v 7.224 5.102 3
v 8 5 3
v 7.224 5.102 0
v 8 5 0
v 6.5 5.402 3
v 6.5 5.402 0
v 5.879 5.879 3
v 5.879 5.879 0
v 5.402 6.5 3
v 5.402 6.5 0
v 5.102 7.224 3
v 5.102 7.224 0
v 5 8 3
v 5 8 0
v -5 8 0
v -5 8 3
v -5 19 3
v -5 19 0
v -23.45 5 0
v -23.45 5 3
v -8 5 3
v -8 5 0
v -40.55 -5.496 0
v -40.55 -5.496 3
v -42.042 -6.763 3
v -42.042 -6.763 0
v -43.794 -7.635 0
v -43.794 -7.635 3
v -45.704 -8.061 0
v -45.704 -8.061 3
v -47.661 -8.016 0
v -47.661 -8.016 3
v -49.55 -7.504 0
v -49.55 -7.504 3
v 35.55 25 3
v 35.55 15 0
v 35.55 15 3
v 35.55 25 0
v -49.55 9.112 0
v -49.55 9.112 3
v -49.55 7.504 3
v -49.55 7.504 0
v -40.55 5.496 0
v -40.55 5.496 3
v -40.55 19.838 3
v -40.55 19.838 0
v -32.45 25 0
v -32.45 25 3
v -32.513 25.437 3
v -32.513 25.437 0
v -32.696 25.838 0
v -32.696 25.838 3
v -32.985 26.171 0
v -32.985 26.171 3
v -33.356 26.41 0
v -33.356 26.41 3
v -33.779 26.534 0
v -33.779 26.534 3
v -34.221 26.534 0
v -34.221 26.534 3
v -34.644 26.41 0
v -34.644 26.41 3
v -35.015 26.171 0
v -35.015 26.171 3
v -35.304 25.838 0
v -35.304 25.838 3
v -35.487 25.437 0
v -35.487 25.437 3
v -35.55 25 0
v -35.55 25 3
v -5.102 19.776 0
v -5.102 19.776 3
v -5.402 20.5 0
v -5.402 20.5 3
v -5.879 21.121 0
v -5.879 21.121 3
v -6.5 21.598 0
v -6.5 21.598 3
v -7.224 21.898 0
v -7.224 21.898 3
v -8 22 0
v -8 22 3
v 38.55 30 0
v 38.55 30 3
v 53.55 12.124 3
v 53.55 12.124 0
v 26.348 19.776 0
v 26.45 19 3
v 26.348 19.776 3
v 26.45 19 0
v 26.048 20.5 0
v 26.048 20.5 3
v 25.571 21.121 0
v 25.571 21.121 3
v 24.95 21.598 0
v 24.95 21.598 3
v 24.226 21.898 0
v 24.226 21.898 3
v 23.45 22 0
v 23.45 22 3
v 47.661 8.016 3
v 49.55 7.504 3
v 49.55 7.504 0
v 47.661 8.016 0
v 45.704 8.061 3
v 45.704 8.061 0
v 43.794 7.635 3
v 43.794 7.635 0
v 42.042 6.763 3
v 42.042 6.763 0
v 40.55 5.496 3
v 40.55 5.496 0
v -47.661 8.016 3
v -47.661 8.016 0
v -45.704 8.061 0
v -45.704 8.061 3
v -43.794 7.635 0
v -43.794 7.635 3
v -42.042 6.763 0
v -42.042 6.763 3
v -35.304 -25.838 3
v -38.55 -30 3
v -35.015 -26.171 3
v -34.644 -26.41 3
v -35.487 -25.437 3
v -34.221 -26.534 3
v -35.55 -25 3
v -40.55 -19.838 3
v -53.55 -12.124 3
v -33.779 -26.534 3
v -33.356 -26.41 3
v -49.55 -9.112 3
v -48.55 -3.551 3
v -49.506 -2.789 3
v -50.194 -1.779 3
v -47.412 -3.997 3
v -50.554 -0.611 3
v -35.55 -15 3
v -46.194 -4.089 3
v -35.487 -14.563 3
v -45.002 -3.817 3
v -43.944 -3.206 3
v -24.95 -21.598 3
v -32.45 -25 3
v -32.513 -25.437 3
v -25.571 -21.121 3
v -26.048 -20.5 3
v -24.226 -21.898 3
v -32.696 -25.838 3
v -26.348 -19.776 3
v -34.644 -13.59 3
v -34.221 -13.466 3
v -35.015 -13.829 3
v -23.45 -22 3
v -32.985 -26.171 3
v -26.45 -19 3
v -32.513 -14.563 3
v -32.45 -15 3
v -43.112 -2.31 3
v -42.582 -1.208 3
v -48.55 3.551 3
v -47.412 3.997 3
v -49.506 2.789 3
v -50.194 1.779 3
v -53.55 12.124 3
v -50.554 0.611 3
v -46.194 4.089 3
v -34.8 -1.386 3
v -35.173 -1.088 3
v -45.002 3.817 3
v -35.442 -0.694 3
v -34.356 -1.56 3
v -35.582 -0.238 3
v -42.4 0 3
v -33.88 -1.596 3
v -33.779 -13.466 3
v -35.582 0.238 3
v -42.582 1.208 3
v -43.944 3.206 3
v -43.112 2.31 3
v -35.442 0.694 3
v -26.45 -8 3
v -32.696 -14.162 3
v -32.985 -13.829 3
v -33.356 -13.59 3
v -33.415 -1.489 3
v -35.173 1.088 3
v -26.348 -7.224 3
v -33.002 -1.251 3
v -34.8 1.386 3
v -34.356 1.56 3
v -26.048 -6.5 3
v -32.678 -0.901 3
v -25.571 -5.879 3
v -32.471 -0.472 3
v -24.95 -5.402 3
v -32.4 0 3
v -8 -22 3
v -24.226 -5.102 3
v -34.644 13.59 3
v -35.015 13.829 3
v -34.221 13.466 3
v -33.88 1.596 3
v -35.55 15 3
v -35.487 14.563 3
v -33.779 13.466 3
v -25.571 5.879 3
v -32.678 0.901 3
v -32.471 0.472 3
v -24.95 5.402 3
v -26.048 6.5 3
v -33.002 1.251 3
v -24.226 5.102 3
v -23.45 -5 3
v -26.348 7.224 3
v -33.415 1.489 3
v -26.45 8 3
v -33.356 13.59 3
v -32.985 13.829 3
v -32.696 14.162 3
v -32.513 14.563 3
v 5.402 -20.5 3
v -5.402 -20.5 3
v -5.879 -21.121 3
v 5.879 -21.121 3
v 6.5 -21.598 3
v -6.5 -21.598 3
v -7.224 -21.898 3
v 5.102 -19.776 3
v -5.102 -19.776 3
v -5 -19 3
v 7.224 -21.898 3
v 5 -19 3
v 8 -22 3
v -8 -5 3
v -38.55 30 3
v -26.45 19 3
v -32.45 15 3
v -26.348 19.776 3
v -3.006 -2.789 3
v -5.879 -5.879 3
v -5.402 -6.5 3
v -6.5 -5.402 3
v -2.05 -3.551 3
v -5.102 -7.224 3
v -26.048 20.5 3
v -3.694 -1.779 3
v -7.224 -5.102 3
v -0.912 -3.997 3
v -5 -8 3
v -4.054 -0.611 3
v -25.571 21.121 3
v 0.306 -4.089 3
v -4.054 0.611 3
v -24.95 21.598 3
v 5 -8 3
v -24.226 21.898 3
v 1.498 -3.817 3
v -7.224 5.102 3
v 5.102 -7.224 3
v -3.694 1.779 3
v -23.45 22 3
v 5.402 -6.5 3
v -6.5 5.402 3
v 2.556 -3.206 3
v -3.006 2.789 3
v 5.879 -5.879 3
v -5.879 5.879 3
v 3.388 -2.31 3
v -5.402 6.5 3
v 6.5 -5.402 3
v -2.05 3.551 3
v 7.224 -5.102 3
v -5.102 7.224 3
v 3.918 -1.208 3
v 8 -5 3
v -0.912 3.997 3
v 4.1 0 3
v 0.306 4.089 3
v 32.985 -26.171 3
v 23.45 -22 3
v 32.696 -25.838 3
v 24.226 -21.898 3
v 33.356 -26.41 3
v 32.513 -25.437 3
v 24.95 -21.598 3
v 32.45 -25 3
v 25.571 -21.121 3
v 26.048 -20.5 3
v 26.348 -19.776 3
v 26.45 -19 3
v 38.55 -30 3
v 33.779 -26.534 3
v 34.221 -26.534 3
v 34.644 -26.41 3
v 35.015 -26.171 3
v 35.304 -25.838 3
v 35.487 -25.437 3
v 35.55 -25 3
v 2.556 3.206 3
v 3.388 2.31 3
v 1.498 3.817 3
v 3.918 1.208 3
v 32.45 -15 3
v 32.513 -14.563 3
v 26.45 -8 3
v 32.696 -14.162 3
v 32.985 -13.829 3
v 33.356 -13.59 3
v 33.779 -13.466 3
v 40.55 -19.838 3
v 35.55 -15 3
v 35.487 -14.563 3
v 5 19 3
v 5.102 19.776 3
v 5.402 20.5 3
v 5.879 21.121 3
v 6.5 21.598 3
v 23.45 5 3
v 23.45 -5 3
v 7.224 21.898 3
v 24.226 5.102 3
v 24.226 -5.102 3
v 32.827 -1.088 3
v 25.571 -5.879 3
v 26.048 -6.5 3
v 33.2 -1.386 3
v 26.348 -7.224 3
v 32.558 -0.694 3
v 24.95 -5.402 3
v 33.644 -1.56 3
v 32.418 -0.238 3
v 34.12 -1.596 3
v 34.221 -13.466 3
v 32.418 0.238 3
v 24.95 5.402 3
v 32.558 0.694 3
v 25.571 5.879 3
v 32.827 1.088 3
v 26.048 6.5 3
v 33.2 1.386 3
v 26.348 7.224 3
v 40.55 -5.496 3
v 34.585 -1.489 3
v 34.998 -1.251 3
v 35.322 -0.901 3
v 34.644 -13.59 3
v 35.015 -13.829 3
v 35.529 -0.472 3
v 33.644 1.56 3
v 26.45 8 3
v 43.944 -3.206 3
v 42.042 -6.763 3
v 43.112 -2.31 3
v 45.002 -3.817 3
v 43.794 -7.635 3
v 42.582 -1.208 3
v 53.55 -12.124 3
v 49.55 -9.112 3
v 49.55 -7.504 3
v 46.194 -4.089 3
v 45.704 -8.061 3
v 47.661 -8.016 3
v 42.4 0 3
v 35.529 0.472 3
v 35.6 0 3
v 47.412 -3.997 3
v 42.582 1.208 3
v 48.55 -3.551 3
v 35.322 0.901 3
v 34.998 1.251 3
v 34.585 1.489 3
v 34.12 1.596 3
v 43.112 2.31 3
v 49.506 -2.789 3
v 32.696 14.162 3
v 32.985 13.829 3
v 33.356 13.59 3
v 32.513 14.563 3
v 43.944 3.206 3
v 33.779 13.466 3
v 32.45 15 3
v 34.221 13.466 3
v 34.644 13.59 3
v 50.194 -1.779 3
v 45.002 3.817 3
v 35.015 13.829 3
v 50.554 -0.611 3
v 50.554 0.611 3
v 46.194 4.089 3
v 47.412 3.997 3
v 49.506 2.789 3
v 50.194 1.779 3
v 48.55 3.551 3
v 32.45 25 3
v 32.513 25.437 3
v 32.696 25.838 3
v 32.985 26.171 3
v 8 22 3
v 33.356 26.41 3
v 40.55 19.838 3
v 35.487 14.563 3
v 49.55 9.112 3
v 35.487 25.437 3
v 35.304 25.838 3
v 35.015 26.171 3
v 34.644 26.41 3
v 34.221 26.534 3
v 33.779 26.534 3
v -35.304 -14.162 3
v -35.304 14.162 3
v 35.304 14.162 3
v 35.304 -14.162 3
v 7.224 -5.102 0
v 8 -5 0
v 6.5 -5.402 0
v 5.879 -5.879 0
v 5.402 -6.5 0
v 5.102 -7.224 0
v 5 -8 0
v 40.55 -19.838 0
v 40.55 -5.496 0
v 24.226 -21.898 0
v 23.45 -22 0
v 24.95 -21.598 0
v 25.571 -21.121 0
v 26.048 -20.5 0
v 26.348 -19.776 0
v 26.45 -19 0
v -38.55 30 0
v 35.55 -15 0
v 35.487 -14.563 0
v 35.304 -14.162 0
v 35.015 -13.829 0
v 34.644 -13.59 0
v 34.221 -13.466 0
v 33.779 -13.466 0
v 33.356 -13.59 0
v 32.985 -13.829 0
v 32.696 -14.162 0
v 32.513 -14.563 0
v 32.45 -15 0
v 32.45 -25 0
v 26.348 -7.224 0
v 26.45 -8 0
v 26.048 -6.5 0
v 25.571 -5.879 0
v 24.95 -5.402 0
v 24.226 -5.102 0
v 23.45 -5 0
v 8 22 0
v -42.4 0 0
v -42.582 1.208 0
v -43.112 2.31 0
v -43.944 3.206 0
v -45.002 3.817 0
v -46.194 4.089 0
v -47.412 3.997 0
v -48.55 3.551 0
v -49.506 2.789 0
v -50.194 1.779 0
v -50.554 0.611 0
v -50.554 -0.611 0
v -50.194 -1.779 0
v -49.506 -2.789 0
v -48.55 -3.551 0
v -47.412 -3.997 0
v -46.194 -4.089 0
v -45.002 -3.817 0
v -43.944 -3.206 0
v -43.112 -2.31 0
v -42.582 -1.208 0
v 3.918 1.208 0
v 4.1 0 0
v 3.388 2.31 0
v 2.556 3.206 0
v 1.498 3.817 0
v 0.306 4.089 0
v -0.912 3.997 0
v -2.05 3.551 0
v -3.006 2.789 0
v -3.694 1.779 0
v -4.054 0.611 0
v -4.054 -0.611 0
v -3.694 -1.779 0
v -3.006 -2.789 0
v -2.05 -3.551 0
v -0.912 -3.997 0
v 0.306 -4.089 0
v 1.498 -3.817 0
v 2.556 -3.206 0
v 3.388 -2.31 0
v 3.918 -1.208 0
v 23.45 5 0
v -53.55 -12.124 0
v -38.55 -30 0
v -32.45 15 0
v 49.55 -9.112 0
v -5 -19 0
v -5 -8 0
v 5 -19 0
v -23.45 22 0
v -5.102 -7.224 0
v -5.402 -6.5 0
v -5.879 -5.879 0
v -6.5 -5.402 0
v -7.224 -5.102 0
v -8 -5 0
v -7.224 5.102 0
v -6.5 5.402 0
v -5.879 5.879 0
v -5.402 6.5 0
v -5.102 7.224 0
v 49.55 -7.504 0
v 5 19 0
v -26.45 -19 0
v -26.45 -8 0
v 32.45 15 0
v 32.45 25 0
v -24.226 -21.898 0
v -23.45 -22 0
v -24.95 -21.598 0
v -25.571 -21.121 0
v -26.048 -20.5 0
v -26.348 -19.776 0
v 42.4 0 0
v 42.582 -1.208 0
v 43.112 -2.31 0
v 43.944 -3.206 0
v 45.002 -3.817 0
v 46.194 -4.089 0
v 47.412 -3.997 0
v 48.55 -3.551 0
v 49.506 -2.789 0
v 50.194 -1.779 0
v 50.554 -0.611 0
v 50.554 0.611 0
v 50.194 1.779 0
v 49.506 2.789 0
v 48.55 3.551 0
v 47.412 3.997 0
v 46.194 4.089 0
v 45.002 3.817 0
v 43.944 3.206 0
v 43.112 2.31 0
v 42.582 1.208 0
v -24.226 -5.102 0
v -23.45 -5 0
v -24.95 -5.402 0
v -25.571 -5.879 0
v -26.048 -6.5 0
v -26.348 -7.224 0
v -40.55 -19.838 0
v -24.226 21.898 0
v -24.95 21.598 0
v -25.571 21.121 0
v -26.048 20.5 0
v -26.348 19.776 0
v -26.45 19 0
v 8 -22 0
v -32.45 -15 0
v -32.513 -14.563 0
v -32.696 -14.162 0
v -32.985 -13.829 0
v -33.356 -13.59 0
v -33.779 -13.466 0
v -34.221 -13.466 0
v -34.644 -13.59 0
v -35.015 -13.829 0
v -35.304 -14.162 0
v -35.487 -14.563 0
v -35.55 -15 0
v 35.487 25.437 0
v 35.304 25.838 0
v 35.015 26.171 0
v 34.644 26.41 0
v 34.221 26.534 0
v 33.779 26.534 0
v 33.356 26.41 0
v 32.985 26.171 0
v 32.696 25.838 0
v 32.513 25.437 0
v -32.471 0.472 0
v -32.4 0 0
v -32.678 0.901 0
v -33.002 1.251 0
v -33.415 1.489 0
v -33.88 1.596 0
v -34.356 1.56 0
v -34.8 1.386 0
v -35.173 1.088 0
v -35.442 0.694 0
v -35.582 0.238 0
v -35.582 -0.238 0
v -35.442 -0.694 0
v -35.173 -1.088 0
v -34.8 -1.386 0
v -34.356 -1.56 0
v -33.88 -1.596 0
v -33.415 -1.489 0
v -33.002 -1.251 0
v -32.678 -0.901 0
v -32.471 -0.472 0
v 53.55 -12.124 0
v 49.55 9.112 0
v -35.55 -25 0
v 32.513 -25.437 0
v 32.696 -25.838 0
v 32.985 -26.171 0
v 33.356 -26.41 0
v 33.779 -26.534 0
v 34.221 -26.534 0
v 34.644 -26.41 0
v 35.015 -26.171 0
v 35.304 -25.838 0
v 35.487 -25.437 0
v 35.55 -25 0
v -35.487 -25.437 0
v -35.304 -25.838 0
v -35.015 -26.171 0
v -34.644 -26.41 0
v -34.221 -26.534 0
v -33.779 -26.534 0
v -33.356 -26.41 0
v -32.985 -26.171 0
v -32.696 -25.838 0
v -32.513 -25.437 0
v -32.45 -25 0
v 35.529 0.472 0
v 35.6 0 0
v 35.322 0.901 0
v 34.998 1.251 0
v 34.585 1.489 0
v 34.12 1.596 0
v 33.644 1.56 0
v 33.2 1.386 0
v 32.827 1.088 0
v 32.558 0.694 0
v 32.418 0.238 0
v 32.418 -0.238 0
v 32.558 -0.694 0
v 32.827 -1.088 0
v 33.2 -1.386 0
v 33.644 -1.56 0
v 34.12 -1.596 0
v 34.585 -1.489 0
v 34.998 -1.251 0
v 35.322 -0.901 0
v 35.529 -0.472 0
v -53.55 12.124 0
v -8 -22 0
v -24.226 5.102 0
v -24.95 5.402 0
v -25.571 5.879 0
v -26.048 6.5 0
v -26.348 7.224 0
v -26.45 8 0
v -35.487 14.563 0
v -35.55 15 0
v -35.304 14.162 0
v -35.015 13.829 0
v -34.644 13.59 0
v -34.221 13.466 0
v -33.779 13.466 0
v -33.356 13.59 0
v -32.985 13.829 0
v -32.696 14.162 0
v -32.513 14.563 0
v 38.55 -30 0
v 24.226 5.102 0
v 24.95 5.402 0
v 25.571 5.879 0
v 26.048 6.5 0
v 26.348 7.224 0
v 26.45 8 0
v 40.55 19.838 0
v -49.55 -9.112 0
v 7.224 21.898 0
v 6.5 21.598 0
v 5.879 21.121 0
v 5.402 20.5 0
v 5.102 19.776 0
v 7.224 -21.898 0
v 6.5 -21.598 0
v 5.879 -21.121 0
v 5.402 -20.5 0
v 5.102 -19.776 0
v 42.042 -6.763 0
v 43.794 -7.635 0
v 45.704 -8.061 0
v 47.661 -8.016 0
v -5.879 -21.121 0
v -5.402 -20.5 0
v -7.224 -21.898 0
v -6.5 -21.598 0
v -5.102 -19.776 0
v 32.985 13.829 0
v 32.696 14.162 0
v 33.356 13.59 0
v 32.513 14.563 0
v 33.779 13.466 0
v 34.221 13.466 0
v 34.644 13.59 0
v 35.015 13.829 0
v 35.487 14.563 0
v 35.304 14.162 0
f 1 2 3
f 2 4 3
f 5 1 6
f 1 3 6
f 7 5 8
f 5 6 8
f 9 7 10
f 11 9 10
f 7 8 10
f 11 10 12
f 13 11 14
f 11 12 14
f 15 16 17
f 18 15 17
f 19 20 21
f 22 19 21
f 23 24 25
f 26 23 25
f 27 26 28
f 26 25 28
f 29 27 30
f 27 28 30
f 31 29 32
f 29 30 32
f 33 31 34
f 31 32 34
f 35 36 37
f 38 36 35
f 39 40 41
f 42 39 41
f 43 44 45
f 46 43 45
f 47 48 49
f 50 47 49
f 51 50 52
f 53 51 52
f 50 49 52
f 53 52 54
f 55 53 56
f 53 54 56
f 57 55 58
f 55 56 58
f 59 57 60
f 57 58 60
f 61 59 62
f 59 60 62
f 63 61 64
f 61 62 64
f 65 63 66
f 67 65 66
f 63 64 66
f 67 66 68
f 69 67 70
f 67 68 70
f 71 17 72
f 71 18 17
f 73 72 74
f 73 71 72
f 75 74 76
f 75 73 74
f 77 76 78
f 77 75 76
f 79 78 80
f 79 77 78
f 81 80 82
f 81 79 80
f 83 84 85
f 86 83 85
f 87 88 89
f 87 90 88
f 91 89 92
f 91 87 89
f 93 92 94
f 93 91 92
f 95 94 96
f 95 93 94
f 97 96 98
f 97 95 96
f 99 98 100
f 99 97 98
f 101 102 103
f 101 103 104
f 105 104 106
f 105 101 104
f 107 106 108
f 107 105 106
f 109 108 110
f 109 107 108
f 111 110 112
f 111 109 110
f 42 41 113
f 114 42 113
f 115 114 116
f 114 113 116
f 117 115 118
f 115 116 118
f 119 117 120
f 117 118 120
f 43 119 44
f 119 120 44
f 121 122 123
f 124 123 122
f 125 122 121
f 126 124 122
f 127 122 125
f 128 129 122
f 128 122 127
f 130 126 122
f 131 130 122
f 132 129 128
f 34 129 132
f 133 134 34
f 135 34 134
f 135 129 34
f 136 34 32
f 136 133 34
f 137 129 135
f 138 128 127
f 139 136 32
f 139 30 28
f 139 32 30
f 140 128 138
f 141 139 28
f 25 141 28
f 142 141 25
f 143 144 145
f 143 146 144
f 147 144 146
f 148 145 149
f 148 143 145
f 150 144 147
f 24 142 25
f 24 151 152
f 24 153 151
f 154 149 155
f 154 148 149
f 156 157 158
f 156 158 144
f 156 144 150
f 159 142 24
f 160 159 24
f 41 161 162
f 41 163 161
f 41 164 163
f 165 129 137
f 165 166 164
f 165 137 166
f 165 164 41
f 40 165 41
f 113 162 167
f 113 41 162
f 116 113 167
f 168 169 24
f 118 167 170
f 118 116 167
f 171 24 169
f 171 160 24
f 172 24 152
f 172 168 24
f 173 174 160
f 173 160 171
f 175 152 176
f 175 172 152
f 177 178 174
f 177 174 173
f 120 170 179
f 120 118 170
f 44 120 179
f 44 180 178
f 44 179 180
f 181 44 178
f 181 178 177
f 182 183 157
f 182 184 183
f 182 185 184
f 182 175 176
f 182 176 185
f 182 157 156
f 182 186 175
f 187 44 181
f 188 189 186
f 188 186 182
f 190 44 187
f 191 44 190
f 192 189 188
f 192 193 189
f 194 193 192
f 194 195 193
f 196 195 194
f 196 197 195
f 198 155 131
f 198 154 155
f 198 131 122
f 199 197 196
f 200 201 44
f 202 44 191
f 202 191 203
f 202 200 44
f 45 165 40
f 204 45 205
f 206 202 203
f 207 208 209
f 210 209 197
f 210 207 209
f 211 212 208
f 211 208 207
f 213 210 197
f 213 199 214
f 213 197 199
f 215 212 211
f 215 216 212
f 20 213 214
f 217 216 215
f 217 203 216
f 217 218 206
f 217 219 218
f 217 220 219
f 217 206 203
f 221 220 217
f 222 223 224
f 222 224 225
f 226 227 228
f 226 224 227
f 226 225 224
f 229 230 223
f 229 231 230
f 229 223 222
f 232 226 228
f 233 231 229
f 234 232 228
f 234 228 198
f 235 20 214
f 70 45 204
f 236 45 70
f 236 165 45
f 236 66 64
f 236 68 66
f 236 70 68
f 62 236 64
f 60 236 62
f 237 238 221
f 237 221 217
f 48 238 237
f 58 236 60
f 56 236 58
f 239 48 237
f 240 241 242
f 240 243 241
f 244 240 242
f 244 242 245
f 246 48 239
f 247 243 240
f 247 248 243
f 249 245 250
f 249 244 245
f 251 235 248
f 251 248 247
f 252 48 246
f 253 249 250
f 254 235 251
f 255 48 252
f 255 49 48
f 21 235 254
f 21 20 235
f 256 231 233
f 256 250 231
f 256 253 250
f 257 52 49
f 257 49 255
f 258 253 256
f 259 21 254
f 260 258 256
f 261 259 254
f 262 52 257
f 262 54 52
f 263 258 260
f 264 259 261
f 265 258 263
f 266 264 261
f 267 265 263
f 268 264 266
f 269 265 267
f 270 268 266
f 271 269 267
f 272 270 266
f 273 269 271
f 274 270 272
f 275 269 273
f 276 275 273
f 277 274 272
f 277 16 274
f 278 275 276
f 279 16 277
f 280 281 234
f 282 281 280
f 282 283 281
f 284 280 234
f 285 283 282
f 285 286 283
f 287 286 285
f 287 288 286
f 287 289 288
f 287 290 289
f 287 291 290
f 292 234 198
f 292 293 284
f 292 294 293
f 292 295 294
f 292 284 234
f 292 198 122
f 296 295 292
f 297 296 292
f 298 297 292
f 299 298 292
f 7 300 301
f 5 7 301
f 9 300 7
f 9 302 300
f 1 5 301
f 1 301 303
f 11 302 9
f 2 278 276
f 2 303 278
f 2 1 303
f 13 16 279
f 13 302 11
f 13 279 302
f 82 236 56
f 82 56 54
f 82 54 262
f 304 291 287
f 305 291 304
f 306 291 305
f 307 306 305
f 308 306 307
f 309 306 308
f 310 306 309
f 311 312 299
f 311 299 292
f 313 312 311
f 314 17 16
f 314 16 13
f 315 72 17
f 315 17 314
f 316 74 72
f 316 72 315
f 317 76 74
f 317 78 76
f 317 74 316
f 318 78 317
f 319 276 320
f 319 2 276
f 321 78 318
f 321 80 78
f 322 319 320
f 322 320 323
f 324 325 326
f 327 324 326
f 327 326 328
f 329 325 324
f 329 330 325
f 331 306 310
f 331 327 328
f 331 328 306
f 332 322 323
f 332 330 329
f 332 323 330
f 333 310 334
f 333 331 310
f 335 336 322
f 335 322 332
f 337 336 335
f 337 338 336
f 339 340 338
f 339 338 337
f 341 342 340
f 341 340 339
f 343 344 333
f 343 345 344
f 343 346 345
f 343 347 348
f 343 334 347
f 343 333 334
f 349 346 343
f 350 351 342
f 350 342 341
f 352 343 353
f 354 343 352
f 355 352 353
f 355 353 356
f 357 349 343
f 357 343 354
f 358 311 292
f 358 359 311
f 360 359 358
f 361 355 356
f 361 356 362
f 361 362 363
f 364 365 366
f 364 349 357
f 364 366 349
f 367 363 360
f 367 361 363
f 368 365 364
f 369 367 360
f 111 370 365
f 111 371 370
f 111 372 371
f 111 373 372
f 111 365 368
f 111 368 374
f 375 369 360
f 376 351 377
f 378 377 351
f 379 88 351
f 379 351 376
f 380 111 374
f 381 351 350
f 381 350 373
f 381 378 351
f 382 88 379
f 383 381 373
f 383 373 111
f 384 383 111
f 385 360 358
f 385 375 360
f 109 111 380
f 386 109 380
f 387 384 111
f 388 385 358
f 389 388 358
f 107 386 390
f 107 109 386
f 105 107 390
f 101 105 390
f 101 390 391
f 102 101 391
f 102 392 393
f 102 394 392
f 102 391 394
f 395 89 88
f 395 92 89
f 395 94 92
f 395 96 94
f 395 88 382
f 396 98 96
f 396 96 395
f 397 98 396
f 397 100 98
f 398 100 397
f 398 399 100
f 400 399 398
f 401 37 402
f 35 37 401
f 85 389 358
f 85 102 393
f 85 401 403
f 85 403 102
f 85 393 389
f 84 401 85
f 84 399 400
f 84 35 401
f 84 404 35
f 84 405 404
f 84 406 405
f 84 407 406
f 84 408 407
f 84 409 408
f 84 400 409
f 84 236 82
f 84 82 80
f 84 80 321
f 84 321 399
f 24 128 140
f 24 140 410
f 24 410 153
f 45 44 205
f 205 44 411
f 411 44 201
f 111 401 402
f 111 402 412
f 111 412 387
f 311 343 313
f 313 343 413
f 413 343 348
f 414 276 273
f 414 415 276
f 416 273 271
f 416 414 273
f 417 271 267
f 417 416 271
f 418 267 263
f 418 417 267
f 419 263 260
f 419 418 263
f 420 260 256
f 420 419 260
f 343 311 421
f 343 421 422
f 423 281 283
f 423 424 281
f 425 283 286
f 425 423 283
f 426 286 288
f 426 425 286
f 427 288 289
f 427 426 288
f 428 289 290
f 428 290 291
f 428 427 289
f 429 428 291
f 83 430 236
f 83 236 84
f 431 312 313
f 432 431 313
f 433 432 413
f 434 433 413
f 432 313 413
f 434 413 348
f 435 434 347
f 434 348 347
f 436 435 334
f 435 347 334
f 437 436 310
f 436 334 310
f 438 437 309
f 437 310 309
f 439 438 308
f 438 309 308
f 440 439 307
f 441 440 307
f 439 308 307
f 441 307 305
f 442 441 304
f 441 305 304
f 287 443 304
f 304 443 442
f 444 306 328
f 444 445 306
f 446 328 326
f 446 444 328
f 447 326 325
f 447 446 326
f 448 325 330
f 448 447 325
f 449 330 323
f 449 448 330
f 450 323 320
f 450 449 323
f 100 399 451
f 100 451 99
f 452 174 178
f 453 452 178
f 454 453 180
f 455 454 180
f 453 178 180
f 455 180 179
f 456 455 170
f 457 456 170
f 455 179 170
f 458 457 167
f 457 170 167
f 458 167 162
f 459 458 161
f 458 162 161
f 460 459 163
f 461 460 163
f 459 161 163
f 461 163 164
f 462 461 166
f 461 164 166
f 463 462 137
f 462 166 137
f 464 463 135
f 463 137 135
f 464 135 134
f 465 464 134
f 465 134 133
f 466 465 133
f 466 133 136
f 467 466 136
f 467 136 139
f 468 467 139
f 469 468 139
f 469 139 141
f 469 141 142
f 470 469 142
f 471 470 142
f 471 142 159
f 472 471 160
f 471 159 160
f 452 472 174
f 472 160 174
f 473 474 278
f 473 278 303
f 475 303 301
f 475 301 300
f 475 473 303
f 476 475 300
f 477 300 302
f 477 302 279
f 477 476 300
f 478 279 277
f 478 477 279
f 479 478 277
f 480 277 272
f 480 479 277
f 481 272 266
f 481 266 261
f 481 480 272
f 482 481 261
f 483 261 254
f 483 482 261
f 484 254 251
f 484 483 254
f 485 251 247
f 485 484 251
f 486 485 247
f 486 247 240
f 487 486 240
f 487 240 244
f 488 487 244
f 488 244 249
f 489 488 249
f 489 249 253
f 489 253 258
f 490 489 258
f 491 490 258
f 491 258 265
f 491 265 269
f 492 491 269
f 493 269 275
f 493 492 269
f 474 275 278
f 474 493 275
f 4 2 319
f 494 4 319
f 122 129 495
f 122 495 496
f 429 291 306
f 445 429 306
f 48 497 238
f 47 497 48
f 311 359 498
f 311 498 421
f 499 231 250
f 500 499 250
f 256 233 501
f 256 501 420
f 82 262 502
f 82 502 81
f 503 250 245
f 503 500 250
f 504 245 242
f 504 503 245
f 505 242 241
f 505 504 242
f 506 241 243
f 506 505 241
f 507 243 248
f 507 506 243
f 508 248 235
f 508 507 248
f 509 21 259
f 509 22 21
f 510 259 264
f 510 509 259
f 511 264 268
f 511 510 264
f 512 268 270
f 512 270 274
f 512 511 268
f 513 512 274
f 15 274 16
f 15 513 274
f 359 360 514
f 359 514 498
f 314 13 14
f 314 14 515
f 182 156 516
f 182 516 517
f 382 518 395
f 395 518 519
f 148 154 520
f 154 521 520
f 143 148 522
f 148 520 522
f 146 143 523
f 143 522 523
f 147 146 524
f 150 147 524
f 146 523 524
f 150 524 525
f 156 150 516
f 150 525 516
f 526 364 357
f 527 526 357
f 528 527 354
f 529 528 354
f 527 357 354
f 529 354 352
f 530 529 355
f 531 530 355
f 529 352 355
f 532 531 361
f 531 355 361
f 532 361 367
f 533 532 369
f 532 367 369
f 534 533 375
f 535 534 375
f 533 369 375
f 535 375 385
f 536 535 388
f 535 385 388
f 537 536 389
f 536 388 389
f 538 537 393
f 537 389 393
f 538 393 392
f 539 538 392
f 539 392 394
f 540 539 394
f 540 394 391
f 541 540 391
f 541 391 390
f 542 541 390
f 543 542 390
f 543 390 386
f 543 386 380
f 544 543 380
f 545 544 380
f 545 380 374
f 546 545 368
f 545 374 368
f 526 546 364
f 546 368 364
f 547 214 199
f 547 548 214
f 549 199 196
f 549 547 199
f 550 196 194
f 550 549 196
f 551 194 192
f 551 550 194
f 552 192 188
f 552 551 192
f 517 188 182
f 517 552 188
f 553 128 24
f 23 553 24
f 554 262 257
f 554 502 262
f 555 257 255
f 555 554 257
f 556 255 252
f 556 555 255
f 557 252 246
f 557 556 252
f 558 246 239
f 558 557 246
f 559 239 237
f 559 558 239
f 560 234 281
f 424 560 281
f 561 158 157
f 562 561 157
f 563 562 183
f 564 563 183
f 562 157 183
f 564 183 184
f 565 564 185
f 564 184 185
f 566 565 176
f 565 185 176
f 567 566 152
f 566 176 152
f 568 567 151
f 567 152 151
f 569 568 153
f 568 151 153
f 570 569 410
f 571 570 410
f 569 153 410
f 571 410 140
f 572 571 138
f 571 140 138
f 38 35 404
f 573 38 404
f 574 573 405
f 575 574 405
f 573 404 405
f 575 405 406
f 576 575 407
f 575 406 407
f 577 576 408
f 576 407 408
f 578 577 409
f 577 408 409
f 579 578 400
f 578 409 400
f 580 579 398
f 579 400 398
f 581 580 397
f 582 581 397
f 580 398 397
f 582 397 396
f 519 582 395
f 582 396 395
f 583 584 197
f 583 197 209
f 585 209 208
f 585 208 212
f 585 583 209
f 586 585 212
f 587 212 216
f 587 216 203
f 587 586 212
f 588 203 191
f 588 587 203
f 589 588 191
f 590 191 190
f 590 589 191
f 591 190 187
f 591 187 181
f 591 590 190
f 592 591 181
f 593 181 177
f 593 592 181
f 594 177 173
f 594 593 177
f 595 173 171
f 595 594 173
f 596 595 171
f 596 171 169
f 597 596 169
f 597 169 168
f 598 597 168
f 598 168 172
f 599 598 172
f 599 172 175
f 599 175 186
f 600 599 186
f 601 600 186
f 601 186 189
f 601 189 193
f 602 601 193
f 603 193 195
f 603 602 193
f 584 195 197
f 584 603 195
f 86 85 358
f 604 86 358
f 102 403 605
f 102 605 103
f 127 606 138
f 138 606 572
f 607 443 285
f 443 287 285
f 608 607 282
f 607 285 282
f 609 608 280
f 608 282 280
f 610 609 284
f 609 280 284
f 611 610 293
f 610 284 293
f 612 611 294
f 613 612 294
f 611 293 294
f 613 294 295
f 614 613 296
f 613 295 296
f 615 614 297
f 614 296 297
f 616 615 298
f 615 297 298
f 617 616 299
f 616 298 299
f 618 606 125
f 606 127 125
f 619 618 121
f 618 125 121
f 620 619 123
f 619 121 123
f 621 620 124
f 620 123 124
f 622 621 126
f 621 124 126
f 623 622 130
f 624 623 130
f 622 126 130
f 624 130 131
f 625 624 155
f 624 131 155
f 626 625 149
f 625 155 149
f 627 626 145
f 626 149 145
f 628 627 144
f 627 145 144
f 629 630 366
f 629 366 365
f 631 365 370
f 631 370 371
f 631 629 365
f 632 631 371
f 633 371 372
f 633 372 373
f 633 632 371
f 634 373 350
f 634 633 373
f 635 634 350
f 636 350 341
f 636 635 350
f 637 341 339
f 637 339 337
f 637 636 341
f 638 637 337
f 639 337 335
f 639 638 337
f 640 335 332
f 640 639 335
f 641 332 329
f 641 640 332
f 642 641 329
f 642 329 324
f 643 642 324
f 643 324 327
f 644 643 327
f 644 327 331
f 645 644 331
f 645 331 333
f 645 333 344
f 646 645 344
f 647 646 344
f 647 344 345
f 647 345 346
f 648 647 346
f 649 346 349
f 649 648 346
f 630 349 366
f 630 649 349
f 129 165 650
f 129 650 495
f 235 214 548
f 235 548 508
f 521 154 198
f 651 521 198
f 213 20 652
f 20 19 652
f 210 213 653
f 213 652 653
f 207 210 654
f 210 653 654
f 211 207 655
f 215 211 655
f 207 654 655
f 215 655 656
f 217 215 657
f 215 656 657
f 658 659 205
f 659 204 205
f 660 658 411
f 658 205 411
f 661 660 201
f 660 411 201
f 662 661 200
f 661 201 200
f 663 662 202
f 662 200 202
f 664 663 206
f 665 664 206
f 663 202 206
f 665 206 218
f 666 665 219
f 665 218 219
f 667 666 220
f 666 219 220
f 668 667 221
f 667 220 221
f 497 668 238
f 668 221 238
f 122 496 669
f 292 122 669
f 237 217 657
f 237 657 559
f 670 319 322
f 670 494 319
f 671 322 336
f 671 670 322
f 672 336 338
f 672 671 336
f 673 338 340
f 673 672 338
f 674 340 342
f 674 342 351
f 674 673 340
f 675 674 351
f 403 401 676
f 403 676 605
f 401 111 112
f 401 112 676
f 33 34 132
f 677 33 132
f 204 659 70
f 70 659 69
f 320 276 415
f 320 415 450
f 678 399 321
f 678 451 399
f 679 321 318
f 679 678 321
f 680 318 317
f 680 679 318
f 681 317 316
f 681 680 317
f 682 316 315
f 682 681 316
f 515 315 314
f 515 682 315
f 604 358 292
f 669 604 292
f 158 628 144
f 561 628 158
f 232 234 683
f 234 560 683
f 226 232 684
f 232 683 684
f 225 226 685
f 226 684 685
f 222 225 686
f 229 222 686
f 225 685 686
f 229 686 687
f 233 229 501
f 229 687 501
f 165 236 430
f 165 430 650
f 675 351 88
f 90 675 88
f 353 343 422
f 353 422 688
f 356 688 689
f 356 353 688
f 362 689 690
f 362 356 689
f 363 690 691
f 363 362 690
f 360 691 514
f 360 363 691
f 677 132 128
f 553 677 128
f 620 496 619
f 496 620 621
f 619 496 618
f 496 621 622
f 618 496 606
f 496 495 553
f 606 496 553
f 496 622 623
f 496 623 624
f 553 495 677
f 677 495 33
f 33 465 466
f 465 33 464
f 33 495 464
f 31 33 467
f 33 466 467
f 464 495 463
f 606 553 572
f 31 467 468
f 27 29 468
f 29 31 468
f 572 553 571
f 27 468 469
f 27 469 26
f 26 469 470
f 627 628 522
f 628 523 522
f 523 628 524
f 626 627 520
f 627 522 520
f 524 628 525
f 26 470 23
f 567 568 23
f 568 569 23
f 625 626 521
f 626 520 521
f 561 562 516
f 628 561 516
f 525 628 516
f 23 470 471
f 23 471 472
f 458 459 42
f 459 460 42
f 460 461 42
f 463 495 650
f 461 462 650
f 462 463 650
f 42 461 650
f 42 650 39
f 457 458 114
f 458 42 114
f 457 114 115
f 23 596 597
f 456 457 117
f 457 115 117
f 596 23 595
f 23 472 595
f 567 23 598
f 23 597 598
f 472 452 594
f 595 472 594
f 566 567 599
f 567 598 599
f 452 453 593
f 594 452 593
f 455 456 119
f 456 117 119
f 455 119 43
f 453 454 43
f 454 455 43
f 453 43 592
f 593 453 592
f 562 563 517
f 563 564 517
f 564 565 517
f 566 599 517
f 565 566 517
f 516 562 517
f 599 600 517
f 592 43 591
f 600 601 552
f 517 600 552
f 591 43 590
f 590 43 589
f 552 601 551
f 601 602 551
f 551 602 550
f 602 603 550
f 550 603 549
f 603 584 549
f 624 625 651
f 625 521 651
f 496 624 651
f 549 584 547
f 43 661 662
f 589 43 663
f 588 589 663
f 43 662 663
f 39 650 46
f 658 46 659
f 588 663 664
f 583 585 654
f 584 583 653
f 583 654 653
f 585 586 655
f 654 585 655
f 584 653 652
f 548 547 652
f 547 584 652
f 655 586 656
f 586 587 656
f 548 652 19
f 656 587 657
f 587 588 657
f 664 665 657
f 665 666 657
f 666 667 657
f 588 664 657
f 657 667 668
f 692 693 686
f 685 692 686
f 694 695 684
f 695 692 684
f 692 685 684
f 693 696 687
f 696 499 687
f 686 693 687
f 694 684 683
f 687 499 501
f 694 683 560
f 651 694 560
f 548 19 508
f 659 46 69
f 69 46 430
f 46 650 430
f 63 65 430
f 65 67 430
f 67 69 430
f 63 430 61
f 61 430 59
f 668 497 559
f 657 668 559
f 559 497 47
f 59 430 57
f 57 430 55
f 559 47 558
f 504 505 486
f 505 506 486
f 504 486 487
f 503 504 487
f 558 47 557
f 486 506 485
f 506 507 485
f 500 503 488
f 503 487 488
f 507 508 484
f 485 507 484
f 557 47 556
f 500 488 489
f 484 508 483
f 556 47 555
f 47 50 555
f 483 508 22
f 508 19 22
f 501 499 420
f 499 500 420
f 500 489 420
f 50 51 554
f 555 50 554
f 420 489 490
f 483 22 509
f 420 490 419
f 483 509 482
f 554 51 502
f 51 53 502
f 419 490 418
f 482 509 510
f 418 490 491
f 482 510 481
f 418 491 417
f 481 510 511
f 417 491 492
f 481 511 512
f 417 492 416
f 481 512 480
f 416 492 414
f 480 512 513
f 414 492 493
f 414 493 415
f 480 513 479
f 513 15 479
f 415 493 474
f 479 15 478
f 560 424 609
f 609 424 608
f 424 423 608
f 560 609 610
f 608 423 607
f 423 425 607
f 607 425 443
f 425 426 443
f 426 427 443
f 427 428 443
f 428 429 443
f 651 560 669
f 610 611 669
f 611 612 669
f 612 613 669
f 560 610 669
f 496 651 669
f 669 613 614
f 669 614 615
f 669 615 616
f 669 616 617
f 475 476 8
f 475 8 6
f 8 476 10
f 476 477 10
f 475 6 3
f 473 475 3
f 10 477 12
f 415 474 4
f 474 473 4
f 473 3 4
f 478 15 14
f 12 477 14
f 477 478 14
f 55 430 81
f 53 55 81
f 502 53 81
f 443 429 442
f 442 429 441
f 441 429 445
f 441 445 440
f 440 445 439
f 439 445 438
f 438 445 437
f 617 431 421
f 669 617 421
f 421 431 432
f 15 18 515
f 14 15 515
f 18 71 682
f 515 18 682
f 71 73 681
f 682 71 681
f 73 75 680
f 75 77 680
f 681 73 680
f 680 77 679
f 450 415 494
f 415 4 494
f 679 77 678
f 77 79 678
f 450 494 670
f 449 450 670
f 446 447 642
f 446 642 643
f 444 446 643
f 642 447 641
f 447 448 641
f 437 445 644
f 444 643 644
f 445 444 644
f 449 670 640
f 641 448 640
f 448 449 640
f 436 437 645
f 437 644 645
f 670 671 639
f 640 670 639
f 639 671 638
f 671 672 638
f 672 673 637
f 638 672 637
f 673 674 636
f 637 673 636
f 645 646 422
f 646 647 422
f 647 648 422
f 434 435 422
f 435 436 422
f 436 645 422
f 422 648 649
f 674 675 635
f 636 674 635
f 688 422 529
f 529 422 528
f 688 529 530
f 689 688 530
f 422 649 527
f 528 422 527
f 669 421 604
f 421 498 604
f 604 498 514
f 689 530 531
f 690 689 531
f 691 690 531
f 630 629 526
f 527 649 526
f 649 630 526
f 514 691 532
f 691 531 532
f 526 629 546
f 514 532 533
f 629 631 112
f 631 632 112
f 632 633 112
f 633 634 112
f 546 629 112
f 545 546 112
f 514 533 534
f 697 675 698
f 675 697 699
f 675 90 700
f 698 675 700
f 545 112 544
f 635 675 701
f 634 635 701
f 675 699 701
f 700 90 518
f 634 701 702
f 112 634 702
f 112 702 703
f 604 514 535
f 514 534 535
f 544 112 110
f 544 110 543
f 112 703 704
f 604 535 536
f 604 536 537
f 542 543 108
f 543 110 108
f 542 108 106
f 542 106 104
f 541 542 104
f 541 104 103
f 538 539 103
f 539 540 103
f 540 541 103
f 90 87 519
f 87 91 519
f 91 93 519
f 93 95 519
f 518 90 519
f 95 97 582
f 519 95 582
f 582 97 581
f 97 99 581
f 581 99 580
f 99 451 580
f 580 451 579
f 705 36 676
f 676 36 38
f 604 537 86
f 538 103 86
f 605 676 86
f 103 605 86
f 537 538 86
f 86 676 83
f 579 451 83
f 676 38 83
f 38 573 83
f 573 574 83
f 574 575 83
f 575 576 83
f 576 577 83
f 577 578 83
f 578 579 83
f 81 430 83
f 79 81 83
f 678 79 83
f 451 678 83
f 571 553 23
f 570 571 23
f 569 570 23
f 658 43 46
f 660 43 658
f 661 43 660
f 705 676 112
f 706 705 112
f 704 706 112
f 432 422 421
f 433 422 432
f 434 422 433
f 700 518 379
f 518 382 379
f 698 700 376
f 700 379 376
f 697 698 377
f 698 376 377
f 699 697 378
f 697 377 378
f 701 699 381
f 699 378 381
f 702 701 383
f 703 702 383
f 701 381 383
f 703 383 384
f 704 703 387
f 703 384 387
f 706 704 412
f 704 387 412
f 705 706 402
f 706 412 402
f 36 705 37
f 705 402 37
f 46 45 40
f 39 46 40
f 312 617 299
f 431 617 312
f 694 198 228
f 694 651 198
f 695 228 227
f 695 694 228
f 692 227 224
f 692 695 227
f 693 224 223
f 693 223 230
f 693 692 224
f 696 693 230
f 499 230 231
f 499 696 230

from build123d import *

# Parameters (mm, degrees)
SKETCH_1_W          = 77.1
SKETCH_1_H          = 60
SKETCH_1_R          = 4.1
SKETCH_1_R_2        = 1.6
SKETCH_1_W_2        = 3.1
SKETCH_1_H_2        = 10
EXTRUDE_1_DEPTH     = 3
SKETCH_2_R          = 1.55
SKETCH_2_W          = 21.45
SKETCH_2_H          = 17
CUT_EXTRUDE_1_DEPTH = 49.939784429
SKETCH_3_R          = 4.1
EXTRUDE_2_DEPTH     = 3
FILLET_1_R          = 3


with BuildPart() as part:
    # 草图1 → 凸台-拉伸1 (new body)
    with BuildSketch(Plane.XY):
        Rectangle(SKETCH_1_W, SKETCH_1_H)
        Circle(SKETCH_1_R, mode=Mode.SUBTRACT)
        with Locations((34, 0)):
            Circle(SKETCH_1_R_2, mode=Mode.SUBTRACT)
        with Locations((-34, 0)):
            Circle(SKETCH_1_R_2, mode=Mode.SUBTRACT)
        with Locations((34, -20)):
            Rectangle(SKETCH_1_W_2, SKETCH_1_H_2, mode=Mode.SUBTRACT)
        with Locations((-34, 20)):
            Rectangle(SKETCH_1_W_2, SKETCH_1_H_2, mode=Mode.SUBTRACT)
        with Locations((-34, -20)):
            Rectangle(SKETCH_1_W_2, SKETCH_1_H_2, mode=Mode.SUBTRACT)
        with Locations((34, 20)):
            Rectangle(SKETCH_1_W_2, SKETCH_1_H_2, mode=Mode.SUBTRACT)
    extrude(amount=EXTRUDE_1_DEPTH)

    # 草图2 → 切除-拉伸1 (cut, through all)
    with BuildSketch(Plane.XY.offset(3)):
        with Locations((-34, 25)):
            Circle(SKETCH_2_R)
        with Locations((-34, 15)):
            Circle(SKETCH_2_R)
        with Locations((34, 25)):
            Circle(SKETCH_2_R)
        with Locations((34, 15)):
            Circle(SKETCH_2_R)
        with Locations((34, -15)):
            Circle(SKETCH_2_R)
        with Locations((34, -25)):
            Circle(SKETCH_2_R)
        with Locations((-34, -15)):
            Circle(SKETCH_2_R)
        with Locations((-34, -25)):
            Circle(SKETCH_2_R)
        with Locations((-15.725, 13.5)):
            Rectangle(SKETCH_2_W, SKETCH_2_H)
        with Locations((15.725, 13.5)):
            Rectangle(SKETCH_2_W, SKETCH_2_H)
        with Locations((-15.725, -13.5)):
            Rectangle(SKETCH_2_W, SKETCH_2_H)
        with Locations((15.725, -13.5)):
            Rectangle(SKETCH_2_W, SKETCH_2_H)
    extrude(amount=-CUT_EXTRUDE_1_DEPTH, mode=Mode.SUBTRACT)

    # 草图3 → 凸台-拉伸2 (add)
    # profile 1 of 2: a face of its own
    with BuildSketch(Plane.XY.offset(3)):
        Polygon((-38.55, 30), (-53.55, 12.123696111), (-53.55, -12.123696111), (-38.55, -30), align=None)
        with Locations((-46.5, 0)):
            Circle(SKETCH_3_R, mode=Mode.SUBTRACT)
        with BuildLine():
            Line((-40.55, 19.837873681), (-49.55, 9.112091347))
            Line((-49.55, 9.112091347), (-49.55, 7.503832354))
            ThreePointArc((-49.55, 7.503832354), (-44.736420639, 7.905680732), (-40.55, 5.496135006))
            Line((-40.55, 5.496135006), (-40.55, 19.837873681))
        make_face(mode=Mode.SUBTRACT)
        with BuildLine():
            Line((-49.55, -7.503832354), (-49.55, -9.112091347))
            Line((-49.55, -9.112091347), (-40.55, -19.837873681))
            Line((-40.55, -19.837873681), (-40.55, -5.496135006))
            ThreePointArc((-40.55, -5.496135006), (-44.736420639, -7.905680732), (-49.55, -7.503832354))
        make_face(mode=Mode.SUBTRACT)
    # profile 2 of 2: a face of its own
    with BuildSketch(Plane.XY.offset(3)):
        Polygon((53.55, -12.123696111), (38.55, -30), (38.55, 30), (53.55, 12.123696111), align=None)
        with Locations(Location((46.5, 0, 0), (0, 0, 180))):
            Circle(SKETCH_3_R, mode=Mode.SUBTRACT)
        with BuildLine():
            Line((40.55, -19.837873681), (40.55, -5.496135006))
            ThreePointArc((40.55, -5.496135006), (44.736420639, -7.905680732), (49.55, -7.503832354))
            Line((49.55, -7.503832354), (49.55, -9.112091347))
            Line((49.55, -9.112091347), (40.55, -19.837873681))
        make_face(mode=Mode.SUBTRACT)
        with BuildLine():
            Line((40.55, 19.837873681), (49.55, 9.112091347))
            Line((49.55, 9.112091347), (49.55, 7.503832354))
            ThreePointArc((49.55, 7.503832354), (44.736420639, 7.905680732), (40.55, 5.496135006))
            Line((40.55, 5.496135006), (40.55, 19.837873681))
        make_face(mode=Mode.SUBTRACT)
    extrude(amount=-EXTRUDE_2_DEPTH)

    # 圆角1
    fillet_1_edges = [part.edges().sort_by_distance(p)[0] for p in [
        (26.45, 5, 1.5),
        (5, 5, 1.5),
        (5, 22, 1.5),
        (26.45, 22, 1.5),
        (-26.45, -22, 1.5),
        (-26.45, -5, 1.5),
        (-5, -5, 1.5),
        (-5, -22, 1.5),
        (26.45, -22, 1.5),
        (5, -22, 1.5),
        (5, -5, 1.5),
        (26.45, -5, 1.5),
        (-26.45, 5, 1.5),
        (-26.45, 22, 1.5),
        (-5, 22, 1.5),
        (-5, 5, 1.5),
    ]]
    fillet(fillet_1_edges, radius=FILLET_1_R)


solid = part.part
